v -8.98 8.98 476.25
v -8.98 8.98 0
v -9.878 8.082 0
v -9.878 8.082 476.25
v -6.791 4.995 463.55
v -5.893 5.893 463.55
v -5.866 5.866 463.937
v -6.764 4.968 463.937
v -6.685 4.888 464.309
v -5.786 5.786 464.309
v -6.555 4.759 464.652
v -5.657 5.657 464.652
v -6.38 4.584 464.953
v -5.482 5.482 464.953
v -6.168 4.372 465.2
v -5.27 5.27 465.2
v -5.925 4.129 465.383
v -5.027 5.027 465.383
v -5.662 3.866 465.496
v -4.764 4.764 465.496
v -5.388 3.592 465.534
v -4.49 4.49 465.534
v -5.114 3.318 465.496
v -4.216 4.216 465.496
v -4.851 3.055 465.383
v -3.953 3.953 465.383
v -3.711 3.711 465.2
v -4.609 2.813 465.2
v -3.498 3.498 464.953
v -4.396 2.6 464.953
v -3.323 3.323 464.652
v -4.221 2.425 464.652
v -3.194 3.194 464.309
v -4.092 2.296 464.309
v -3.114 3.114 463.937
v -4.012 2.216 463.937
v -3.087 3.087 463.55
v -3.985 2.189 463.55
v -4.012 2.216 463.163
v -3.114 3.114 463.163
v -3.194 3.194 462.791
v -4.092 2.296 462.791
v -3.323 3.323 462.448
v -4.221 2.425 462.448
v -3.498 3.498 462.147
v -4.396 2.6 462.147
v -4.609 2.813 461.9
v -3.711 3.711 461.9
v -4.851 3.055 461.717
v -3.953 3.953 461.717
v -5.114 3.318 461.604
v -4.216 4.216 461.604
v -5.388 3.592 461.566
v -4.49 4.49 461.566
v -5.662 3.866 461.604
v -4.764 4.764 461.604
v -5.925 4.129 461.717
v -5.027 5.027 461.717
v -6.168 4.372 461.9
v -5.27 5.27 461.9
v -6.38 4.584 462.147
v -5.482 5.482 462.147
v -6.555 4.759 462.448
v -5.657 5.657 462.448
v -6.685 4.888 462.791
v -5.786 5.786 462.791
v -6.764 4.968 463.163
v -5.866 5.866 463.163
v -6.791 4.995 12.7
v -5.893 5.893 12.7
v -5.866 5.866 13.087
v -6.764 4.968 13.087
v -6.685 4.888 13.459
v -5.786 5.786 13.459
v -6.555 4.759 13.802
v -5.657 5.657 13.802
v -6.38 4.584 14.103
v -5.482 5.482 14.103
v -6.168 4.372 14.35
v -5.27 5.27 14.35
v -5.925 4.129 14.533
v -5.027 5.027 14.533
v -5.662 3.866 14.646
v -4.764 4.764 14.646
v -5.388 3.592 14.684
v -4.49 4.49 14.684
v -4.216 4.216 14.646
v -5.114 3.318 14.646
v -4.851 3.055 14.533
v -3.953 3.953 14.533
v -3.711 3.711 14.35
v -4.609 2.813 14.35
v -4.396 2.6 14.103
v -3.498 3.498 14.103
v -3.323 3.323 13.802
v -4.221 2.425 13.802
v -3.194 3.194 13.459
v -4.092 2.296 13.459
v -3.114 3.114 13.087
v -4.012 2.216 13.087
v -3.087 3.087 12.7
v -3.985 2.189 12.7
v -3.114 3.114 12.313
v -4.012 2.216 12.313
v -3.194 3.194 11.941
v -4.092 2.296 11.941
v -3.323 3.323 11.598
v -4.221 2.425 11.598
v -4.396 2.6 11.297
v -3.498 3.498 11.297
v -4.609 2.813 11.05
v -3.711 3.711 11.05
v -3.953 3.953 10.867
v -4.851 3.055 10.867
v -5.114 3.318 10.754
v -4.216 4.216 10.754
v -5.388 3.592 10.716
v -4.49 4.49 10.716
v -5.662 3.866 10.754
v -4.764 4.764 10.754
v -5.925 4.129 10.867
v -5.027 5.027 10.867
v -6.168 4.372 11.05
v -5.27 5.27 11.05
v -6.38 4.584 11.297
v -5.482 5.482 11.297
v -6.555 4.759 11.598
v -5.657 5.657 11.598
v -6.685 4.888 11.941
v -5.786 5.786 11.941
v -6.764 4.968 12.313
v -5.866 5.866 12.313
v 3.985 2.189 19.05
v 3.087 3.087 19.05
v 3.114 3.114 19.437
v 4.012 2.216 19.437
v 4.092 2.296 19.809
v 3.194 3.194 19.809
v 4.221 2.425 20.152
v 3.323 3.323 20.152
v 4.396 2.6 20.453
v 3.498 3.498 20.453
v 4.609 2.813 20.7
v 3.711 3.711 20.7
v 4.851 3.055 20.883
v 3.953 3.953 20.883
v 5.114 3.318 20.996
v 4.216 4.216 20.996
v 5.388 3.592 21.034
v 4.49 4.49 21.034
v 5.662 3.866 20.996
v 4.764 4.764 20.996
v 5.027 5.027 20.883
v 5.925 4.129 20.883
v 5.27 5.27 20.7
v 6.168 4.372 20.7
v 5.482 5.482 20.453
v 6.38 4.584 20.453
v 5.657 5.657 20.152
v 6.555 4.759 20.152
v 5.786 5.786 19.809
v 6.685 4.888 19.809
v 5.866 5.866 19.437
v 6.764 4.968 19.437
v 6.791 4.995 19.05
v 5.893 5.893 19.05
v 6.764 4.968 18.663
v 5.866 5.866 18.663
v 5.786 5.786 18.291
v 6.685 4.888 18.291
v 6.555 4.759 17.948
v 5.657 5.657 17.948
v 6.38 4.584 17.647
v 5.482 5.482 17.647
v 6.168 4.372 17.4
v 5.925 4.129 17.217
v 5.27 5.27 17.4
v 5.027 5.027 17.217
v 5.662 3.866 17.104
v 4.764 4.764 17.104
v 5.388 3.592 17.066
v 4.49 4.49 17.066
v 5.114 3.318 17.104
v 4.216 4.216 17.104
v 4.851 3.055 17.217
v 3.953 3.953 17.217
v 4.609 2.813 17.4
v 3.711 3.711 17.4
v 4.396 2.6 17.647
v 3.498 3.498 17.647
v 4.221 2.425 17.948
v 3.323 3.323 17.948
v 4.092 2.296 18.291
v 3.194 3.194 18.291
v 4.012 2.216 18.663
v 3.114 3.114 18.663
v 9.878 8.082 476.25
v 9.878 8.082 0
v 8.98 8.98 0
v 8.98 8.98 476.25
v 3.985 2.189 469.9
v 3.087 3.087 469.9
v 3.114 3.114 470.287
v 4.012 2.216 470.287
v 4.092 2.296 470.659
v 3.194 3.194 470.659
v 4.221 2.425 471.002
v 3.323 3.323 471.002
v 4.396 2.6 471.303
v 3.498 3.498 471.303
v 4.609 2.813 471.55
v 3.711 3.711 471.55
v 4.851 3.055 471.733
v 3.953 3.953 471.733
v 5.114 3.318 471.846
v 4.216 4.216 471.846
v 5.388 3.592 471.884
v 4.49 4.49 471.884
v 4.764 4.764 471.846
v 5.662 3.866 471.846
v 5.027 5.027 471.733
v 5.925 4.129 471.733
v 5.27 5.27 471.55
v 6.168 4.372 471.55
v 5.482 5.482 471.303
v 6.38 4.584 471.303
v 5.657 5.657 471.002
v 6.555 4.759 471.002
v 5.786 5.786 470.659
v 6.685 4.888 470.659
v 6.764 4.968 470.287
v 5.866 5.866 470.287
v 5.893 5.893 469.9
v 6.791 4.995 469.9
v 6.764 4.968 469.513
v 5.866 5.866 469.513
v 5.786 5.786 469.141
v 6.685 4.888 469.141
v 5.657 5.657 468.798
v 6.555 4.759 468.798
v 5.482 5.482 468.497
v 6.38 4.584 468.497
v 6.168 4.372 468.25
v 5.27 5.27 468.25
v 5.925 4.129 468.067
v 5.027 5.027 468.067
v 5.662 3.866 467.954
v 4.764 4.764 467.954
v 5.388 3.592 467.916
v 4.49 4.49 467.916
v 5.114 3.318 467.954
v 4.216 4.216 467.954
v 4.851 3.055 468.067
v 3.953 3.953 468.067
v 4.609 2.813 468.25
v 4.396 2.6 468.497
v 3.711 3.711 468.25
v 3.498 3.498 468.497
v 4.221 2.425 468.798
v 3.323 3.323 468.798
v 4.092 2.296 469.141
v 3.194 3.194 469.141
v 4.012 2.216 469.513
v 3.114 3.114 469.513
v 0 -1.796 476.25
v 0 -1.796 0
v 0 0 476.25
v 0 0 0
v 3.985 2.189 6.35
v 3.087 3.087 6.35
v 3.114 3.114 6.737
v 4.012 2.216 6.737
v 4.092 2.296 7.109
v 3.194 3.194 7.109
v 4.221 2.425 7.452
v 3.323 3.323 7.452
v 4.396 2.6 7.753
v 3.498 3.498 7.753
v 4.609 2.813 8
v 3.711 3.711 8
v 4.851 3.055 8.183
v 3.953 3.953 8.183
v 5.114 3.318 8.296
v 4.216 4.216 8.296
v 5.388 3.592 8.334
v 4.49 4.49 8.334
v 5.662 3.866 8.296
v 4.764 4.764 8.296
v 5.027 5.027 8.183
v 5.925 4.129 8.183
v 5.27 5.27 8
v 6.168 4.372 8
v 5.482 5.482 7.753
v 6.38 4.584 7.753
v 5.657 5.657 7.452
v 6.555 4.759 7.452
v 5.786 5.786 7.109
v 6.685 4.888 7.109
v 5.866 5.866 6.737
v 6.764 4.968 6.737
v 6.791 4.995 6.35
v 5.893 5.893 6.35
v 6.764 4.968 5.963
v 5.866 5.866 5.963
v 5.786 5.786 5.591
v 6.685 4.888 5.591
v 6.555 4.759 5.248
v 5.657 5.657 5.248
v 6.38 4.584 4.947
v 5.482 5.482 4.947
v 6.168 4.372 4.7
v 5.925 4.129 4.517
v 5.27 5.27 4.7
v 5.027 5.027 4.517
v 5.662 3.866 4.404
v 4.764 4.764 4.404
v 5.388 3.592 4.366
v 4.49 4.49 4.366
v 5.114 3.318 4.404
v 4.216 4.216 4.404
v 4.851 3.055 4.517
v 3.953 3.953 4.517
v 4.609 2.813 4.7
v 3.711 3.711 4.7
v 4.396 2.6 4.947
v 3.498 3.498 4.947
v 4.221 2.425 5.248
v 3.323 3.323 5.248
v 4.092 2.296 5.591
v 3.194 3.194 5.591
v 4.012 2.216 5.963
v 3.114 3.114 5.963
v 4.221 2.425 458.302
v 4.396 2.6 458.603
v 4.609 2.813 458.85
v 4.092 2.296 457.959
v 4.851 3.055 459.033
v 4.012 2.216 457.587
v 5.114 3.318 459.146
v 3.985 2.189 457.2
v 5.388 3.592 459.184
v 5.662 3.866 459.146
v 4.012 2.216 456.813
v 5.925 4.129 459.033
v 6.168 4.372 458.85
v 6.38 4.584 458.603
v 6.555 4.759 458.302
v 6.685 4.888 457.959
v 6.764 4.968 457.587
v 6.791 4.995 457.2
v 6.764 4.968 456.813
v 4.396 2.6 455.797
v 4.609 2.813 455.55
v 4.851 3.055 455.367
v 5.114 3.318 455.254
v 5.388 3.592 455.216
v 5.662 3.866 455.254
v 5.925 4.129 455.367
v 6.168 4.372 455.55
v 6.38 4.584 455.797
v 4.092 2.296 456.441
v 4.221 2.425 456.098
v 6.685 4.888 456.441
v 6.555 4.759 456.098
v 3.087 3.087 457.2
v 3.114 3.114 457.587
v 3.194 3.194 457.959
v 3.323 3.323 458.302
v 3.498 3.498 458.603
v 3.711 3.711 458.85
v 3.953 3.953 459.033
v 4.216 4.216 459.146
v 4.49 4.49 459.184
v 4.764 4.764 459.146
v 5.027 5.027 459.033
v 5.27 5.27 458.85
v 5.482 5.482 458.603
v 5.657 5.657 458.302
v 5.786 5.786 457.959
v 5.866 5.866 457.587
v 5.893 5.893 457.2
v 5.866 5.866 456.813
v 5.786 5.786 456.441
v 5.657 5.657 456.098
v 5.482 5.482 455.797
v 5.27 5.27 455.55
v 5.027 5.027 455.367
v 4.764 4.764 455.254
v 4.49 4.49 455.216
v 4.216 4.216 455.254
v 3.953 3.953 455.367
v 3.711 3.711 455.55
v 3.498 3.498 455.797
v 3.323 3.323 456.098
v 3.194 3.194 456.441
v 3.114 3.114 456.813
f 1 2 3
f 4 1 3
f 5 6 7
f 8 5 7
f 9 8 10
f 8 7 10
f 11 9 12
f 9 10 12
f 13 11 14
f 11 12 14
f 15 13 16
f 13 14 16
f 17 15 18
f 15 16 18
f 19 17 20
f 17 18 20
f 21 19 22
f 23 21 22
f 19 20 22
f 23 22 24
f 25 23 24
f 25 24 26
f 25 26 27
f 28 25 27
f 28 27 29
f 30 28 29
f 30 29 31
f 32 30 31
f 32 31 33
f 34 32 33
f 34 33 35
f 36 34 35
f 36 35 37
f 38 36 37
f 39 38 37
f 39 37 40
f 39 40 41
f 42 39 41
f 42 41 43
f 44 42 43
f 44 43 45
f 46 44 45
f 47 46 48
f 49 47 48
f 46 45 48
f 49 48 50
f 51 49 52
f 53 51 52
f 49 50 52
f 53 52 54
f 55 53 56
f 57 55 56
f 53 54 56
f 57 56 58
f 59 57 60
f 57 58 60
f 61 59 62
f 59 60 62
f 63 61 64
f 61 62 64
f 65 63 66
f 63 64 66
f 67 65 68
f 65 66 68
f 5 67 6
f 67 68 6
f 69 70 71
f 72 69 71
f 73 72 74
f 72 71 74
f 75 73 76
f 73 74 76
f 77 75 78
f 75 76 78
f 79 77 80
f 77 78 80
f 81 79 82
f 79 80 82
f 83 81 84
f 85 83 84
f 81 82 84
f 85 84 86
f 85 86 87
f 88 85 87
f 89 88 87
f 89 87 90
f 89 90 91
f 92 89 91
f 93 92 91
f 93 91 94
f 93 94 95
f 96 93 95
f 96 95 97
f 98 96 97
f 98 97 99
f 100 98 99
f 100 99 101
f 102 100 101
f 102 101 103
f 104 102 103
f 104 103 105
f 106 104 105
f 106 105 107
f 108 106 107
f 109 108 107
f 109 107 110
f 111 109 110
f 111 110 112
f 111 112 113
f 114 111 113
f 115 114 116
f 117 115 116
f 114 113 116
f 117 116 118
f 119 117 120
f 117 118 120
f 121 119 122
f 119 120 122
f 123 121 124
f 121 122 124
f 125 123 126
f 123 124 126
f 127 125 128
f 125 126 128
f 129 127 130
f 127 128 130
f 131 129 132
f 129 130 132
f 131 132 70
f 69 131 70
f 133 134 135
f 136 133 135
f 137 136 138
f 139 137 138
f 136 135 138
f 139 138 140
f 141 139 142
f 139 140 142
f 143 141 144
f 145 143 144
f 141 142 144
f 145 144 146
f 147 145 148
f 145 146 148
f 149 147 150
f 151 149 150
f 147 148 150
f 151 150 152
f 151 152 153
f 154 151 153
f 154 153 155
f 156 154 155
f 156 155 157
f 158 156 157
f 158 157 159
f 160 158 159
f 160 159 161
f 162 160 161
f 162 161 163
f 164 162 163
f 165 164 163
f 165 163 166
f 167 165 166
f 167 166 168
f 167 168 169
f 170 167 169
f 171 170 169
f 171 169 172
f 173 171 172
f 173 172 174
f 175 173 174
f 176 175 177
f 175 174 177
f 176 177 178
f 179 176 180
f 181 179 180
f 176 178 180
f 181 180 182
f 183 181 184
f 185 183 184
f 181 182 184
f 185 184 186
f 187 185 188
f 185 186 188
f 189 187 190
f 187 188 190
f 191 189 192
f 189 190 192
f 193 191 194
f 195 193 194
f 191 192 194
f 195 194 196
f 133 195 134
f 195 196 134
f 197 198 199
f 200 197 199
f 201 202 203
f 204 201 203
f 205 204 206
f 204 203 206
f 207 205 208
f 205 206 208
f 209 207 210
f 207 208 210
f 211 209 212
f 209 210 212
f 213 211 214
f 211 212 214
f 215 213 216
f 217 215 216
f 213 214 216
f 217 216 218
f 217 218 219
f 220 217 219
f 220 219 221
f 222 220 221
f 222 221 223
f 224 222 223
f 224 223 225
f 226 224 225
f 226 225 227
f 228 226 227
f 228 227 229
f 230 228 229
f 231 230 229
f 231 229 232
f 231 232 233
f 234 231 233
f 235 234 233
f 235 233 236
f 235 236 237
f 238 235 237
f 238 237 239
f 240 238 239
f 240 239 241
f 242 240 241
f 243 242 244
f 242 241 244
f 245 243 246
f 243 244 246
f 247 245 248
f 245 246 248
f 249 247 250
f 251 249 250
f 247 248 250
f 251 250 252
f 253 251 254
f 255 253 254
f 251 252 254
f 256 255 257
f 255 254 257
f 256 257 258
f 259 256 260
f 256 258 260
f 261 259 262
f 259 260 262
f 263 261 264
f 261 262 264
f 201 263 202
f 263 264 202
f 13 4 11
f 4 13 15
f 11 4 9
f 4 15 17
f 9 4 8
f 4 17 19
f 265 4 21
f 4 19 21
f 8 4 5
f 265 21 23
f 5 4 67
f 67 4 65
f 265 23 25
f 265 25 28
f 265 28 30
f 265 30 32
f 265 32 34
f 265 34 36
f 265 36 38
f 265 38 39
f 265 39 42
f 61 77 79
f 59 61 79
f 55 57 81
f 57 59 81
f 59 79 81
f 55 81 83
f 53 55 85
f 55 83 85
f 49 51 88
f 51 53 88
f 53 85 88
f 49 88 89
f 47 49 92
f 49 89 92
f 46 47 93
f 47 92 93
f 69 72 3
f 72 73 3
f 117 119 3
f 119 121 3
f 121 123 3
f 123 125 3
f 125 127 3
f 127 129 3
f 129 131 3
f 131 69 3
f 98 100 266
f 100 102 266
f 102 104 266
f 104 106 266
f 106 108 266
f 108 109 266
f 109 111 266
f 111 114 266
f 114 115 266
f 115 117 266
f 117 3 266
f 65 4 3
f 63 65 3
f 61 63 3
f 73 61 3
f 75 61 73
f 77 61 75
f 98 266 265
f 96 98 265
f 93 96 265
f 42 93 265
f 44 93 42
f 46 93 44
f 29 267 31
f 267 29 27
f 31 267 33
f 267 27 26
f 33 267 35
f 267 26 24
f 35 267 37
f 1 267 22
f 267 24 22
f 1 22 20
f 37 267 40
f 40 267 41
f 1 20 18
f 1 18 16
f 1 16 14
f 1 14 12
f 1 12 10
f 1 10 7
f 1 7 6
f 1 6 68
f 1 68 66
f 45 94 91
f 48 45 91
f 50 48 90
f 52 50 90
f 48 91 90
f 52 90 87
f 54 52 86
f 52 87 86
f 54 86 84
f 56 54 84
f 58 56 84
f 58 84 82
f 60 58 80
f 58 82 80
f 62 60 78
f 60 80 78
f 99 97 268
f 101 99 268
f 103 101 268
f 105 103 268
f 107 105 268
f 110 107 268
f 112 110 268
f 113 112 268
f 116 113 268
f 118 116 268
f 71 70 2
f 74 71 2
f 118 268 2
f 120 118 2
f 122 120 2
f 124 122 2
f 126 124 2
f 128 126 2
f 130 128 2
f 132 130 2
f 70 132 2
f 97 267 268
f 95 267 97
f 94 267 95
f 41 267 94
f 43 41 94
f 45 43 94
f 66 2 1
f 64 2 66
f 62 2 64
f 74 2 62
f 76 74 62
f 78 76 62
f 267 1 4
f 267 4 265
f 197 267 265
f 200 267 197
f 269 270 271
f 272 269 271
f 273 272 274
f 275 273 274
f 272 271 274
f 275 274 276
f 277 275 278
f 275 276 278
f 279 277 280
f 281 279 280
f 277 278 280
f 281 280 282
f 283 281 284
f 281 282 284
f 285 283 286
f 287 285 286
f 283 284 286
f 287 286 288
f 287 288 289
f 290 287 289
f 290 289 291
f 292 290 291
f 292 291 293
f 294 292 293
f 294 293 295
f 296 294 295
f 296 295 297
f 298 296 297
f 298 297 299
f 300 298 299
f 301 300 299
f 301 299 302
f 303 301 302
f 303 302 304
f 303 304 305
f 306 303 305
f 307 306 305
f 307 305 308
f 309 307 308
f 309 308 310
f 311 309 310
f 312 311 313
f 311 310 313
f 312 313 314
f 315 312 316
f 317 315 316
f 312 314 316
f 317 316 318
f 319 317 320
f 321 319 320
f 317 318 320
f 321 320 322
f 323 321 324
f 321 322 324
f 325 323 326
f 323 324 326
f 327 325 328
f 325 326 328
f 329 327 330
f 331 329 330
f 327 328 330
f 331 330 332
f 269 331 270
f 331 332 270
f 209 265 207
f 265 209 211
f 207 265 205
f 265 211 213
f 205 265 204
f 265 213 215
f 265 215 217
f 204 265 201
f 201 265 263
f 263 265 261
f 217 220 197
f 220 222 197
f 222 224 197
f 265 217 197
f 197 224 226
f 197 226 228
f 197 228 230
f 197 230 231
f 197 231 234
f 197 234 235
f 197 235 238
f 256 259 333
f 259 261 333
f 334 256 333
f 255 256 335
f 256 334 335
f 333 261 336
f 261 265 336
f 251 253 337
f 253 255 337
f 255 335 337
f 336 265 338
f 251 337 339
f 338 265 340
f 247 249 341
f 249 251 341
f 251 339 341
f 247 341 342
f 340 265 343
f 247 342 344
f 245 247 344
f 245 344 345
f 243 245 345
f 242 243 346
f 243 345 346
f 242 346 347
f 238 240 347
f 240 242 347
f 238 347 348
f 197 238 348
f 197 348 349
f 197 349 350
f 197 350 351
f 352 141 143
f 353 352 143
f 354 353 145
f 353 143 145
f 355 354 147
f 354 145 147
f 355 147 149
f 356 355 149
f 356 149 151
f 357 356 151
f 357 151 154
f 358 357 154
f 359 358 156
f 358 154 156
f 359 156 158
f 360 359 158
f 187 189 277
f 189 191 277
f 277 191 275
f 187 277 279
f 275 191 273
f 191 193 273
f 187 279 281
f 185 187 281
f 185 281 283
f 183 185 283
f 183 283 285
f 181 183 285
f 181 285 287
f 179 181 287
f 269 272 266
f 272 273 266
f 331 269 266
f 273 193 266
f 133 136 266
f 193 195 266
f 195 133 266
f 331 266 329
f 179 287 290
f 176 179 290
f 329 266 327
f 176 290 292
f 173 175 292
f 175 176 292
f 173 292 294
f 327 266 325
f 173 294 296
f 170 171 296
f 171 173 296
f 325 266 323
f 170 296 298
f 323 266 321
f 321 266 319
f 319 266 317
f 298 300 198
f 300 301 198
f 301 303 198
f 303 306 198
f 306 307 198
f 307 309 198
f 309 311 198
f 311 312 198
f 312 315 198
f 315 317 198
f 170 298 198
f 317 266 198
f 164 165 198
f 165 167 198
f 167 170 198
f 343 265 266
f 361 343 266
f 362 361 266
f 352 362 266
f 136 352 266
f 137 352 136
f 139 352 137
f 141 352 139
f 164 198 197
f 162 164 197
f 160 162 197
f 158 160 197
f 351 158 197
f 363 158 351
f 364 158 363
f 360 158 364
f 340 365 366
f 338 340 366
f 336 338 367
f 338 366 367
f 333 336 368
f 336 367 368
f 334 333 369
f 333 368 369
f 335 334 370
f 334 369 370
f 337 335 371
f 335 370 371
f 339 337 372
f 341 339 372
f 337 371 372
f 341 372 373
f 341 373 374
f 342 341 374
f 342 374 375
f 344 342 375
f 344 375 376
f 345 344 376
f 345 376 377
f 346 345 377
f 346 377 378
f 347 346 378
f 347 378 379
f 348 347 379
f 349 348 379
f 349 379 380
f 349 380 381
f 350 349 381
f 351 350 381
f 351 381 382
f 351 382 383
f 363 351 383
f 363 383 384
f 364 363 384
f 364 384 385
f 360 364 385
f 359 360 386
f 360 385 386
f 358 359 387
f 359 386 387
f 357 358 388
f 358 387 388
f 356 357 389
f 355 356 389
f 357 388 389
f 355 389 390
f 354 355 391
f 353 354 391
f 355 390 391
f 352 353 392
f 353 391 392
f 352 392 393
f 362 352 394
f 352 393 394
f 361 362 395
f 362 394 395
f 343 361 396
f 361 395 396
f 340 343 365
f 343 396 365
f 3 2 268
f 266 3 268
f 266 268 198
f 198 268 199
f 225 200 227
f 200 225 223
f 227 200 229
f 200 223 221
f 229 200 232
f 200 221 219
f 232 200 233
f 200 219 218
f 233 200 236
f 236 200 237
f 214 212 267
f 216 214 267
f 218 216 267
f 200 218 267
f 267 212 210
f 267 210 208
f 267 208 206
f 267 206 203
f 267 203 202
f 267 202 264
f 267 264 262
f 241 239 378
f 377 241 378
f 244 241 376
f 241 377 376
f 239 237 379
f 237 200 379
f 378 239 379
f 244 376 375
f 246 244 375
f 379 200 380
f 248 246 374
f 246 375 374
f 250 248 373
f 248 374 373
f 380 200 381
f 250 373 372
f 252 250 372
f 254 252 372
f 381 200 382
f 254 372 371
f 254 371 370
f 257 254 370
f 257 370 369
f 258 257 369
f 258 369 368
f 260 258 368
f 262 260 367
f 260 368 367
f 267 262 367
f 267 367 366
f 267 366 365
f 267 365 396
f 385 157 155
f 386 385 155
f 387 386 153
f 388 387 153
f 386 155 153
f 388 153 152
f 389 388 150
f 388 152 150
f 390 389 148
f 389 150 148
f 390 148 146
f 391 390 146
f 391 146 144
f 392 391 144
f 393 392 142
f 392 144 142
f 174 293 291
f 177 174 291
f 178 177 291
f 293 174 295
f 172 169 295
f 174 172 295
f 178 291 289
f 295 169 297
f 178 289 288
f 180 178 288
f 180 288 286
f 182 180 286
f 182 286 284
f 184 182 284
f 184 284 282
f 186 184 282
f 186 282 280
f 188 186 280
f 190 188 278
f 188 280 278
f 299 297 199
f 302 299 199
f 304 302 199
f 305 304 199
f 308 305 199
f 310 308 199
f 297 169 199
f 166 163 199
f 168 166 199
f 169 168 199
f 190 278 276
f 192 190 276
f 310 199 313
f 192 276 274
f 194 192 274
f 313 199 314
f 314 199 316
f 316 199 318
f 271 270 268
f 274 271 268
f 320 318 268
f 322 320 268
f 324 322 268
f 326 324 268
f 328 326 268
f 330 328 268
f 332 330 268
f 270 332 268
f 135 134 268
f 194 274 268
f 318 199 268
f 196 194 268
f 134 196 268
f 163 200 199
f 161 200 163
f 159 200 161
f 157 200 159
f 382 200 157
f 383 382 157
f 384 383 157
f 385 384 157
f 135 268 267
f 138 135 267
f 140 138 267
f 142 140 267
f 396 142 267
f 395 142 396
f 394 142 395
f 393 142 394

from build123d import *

# Parameters (mm, degrees)
BOSS_EXTRUDE1_DEPTH = 476.25
SKETCH2_R           = 1.984375
CUT_EXTRUDE1_DEPTH  = 477.43707659
SKETCH3_R           = 1.984375
CUT_EXTRUDE2_DEPTH  = 477.43707659
SKETCH4_R           = 1.984375
CUT_EXTRUDE3_DEPTH  = 477.43707659
SKETCH5_R           = 1.984375
CUT_EXTRUDE4_DEPTH  = 477.43707659


with BuildPart() as part:
    # Sketch1 → Boss-Extrude1 (new body)
    with BuildSketch(Plane.XY):
        Polygon((0, 0), (-8.980256121, 8.980256121), (-9.878281733, 8.082230509), (0, -1.796051224), (9.878281733, 8.082230509), (8.980256121, 8.980256121), align=None)
    extrude(amount=BOSS_EXTRUDE1_DEPTH)

    # Sketch2 → Cut-Extrude1 (cut, through all)
    with BuildSketch(Plane(origin=(0, 0, 0), x_dir=(0, 0, 1), z_dir=(-0.7071067811865469, 0.7071067811865481, 0))):
        with Locations(Location((469.9, 6.35, 0), (0, 0, 270))):
            Circle(SKETCH2_R)
        with Locations(Location((457.2, 6.35, 0), (0, 0, 270))):
            Circle(SKETCH2_R)
    extrude(amount=-CUT_EXTRUDE1_DEPTH, mode=Mode.SUBTRACT)

    # Sketch3 → Cut-Extrude2 (cut, through all)
    with BuildSketch(Plane(origin=(0, 0, 0), x_dir=(0, 0, -1), z_dir=(0.7071067811865483, 0.7071067811865468, 0))):
        with Locations(Location((-463.55, 6.35, 0), (0, 0, 90))):
            Circle(SKETCH3_R)
    extrude(amount=-CUT_EXTRUDE2_DEPTH, mode=Mode.SUBTRACT)

    # Sketch4 → Cut-Extrude3 (cut, through all)
    with BuildSketch(Plane(origin=(0, 0, 0), x_dir=(0, 0, 1), z_dir=(-0.7071067811865471, 0.7071067811865479, 0))):
        with Locations(Location((6.35, 6.35, 0), (0, 0, 270))):
            Circle(SKETCH4_R)
        with Locations(Location((19.05, 6.35, 0), (0, 0, 270))):
            Circle(SKETCH4_R)
    extrude(amount=-CUT_EXTRUDE3_DEPTH, mode=Mode.SUBTRACT)

    # Sketch5 → Cut-Extrude4 (cut, through all)
    with BuildSketch(Plane(origin=(0, 0, 0), x_dir=(0, 0, -1), z_dir=(0.7071067811865482, 0.7071067811865468, 0))):
        with Locations(Location((-12.7, 6.35, 0), (0, 0, 90))):
            Circle(SKETCH5_R)
    extrude(amount=-CUT_EXTRUDE4_DEPTH, mode=Mode.SUBTRACT)


solid = part.part
